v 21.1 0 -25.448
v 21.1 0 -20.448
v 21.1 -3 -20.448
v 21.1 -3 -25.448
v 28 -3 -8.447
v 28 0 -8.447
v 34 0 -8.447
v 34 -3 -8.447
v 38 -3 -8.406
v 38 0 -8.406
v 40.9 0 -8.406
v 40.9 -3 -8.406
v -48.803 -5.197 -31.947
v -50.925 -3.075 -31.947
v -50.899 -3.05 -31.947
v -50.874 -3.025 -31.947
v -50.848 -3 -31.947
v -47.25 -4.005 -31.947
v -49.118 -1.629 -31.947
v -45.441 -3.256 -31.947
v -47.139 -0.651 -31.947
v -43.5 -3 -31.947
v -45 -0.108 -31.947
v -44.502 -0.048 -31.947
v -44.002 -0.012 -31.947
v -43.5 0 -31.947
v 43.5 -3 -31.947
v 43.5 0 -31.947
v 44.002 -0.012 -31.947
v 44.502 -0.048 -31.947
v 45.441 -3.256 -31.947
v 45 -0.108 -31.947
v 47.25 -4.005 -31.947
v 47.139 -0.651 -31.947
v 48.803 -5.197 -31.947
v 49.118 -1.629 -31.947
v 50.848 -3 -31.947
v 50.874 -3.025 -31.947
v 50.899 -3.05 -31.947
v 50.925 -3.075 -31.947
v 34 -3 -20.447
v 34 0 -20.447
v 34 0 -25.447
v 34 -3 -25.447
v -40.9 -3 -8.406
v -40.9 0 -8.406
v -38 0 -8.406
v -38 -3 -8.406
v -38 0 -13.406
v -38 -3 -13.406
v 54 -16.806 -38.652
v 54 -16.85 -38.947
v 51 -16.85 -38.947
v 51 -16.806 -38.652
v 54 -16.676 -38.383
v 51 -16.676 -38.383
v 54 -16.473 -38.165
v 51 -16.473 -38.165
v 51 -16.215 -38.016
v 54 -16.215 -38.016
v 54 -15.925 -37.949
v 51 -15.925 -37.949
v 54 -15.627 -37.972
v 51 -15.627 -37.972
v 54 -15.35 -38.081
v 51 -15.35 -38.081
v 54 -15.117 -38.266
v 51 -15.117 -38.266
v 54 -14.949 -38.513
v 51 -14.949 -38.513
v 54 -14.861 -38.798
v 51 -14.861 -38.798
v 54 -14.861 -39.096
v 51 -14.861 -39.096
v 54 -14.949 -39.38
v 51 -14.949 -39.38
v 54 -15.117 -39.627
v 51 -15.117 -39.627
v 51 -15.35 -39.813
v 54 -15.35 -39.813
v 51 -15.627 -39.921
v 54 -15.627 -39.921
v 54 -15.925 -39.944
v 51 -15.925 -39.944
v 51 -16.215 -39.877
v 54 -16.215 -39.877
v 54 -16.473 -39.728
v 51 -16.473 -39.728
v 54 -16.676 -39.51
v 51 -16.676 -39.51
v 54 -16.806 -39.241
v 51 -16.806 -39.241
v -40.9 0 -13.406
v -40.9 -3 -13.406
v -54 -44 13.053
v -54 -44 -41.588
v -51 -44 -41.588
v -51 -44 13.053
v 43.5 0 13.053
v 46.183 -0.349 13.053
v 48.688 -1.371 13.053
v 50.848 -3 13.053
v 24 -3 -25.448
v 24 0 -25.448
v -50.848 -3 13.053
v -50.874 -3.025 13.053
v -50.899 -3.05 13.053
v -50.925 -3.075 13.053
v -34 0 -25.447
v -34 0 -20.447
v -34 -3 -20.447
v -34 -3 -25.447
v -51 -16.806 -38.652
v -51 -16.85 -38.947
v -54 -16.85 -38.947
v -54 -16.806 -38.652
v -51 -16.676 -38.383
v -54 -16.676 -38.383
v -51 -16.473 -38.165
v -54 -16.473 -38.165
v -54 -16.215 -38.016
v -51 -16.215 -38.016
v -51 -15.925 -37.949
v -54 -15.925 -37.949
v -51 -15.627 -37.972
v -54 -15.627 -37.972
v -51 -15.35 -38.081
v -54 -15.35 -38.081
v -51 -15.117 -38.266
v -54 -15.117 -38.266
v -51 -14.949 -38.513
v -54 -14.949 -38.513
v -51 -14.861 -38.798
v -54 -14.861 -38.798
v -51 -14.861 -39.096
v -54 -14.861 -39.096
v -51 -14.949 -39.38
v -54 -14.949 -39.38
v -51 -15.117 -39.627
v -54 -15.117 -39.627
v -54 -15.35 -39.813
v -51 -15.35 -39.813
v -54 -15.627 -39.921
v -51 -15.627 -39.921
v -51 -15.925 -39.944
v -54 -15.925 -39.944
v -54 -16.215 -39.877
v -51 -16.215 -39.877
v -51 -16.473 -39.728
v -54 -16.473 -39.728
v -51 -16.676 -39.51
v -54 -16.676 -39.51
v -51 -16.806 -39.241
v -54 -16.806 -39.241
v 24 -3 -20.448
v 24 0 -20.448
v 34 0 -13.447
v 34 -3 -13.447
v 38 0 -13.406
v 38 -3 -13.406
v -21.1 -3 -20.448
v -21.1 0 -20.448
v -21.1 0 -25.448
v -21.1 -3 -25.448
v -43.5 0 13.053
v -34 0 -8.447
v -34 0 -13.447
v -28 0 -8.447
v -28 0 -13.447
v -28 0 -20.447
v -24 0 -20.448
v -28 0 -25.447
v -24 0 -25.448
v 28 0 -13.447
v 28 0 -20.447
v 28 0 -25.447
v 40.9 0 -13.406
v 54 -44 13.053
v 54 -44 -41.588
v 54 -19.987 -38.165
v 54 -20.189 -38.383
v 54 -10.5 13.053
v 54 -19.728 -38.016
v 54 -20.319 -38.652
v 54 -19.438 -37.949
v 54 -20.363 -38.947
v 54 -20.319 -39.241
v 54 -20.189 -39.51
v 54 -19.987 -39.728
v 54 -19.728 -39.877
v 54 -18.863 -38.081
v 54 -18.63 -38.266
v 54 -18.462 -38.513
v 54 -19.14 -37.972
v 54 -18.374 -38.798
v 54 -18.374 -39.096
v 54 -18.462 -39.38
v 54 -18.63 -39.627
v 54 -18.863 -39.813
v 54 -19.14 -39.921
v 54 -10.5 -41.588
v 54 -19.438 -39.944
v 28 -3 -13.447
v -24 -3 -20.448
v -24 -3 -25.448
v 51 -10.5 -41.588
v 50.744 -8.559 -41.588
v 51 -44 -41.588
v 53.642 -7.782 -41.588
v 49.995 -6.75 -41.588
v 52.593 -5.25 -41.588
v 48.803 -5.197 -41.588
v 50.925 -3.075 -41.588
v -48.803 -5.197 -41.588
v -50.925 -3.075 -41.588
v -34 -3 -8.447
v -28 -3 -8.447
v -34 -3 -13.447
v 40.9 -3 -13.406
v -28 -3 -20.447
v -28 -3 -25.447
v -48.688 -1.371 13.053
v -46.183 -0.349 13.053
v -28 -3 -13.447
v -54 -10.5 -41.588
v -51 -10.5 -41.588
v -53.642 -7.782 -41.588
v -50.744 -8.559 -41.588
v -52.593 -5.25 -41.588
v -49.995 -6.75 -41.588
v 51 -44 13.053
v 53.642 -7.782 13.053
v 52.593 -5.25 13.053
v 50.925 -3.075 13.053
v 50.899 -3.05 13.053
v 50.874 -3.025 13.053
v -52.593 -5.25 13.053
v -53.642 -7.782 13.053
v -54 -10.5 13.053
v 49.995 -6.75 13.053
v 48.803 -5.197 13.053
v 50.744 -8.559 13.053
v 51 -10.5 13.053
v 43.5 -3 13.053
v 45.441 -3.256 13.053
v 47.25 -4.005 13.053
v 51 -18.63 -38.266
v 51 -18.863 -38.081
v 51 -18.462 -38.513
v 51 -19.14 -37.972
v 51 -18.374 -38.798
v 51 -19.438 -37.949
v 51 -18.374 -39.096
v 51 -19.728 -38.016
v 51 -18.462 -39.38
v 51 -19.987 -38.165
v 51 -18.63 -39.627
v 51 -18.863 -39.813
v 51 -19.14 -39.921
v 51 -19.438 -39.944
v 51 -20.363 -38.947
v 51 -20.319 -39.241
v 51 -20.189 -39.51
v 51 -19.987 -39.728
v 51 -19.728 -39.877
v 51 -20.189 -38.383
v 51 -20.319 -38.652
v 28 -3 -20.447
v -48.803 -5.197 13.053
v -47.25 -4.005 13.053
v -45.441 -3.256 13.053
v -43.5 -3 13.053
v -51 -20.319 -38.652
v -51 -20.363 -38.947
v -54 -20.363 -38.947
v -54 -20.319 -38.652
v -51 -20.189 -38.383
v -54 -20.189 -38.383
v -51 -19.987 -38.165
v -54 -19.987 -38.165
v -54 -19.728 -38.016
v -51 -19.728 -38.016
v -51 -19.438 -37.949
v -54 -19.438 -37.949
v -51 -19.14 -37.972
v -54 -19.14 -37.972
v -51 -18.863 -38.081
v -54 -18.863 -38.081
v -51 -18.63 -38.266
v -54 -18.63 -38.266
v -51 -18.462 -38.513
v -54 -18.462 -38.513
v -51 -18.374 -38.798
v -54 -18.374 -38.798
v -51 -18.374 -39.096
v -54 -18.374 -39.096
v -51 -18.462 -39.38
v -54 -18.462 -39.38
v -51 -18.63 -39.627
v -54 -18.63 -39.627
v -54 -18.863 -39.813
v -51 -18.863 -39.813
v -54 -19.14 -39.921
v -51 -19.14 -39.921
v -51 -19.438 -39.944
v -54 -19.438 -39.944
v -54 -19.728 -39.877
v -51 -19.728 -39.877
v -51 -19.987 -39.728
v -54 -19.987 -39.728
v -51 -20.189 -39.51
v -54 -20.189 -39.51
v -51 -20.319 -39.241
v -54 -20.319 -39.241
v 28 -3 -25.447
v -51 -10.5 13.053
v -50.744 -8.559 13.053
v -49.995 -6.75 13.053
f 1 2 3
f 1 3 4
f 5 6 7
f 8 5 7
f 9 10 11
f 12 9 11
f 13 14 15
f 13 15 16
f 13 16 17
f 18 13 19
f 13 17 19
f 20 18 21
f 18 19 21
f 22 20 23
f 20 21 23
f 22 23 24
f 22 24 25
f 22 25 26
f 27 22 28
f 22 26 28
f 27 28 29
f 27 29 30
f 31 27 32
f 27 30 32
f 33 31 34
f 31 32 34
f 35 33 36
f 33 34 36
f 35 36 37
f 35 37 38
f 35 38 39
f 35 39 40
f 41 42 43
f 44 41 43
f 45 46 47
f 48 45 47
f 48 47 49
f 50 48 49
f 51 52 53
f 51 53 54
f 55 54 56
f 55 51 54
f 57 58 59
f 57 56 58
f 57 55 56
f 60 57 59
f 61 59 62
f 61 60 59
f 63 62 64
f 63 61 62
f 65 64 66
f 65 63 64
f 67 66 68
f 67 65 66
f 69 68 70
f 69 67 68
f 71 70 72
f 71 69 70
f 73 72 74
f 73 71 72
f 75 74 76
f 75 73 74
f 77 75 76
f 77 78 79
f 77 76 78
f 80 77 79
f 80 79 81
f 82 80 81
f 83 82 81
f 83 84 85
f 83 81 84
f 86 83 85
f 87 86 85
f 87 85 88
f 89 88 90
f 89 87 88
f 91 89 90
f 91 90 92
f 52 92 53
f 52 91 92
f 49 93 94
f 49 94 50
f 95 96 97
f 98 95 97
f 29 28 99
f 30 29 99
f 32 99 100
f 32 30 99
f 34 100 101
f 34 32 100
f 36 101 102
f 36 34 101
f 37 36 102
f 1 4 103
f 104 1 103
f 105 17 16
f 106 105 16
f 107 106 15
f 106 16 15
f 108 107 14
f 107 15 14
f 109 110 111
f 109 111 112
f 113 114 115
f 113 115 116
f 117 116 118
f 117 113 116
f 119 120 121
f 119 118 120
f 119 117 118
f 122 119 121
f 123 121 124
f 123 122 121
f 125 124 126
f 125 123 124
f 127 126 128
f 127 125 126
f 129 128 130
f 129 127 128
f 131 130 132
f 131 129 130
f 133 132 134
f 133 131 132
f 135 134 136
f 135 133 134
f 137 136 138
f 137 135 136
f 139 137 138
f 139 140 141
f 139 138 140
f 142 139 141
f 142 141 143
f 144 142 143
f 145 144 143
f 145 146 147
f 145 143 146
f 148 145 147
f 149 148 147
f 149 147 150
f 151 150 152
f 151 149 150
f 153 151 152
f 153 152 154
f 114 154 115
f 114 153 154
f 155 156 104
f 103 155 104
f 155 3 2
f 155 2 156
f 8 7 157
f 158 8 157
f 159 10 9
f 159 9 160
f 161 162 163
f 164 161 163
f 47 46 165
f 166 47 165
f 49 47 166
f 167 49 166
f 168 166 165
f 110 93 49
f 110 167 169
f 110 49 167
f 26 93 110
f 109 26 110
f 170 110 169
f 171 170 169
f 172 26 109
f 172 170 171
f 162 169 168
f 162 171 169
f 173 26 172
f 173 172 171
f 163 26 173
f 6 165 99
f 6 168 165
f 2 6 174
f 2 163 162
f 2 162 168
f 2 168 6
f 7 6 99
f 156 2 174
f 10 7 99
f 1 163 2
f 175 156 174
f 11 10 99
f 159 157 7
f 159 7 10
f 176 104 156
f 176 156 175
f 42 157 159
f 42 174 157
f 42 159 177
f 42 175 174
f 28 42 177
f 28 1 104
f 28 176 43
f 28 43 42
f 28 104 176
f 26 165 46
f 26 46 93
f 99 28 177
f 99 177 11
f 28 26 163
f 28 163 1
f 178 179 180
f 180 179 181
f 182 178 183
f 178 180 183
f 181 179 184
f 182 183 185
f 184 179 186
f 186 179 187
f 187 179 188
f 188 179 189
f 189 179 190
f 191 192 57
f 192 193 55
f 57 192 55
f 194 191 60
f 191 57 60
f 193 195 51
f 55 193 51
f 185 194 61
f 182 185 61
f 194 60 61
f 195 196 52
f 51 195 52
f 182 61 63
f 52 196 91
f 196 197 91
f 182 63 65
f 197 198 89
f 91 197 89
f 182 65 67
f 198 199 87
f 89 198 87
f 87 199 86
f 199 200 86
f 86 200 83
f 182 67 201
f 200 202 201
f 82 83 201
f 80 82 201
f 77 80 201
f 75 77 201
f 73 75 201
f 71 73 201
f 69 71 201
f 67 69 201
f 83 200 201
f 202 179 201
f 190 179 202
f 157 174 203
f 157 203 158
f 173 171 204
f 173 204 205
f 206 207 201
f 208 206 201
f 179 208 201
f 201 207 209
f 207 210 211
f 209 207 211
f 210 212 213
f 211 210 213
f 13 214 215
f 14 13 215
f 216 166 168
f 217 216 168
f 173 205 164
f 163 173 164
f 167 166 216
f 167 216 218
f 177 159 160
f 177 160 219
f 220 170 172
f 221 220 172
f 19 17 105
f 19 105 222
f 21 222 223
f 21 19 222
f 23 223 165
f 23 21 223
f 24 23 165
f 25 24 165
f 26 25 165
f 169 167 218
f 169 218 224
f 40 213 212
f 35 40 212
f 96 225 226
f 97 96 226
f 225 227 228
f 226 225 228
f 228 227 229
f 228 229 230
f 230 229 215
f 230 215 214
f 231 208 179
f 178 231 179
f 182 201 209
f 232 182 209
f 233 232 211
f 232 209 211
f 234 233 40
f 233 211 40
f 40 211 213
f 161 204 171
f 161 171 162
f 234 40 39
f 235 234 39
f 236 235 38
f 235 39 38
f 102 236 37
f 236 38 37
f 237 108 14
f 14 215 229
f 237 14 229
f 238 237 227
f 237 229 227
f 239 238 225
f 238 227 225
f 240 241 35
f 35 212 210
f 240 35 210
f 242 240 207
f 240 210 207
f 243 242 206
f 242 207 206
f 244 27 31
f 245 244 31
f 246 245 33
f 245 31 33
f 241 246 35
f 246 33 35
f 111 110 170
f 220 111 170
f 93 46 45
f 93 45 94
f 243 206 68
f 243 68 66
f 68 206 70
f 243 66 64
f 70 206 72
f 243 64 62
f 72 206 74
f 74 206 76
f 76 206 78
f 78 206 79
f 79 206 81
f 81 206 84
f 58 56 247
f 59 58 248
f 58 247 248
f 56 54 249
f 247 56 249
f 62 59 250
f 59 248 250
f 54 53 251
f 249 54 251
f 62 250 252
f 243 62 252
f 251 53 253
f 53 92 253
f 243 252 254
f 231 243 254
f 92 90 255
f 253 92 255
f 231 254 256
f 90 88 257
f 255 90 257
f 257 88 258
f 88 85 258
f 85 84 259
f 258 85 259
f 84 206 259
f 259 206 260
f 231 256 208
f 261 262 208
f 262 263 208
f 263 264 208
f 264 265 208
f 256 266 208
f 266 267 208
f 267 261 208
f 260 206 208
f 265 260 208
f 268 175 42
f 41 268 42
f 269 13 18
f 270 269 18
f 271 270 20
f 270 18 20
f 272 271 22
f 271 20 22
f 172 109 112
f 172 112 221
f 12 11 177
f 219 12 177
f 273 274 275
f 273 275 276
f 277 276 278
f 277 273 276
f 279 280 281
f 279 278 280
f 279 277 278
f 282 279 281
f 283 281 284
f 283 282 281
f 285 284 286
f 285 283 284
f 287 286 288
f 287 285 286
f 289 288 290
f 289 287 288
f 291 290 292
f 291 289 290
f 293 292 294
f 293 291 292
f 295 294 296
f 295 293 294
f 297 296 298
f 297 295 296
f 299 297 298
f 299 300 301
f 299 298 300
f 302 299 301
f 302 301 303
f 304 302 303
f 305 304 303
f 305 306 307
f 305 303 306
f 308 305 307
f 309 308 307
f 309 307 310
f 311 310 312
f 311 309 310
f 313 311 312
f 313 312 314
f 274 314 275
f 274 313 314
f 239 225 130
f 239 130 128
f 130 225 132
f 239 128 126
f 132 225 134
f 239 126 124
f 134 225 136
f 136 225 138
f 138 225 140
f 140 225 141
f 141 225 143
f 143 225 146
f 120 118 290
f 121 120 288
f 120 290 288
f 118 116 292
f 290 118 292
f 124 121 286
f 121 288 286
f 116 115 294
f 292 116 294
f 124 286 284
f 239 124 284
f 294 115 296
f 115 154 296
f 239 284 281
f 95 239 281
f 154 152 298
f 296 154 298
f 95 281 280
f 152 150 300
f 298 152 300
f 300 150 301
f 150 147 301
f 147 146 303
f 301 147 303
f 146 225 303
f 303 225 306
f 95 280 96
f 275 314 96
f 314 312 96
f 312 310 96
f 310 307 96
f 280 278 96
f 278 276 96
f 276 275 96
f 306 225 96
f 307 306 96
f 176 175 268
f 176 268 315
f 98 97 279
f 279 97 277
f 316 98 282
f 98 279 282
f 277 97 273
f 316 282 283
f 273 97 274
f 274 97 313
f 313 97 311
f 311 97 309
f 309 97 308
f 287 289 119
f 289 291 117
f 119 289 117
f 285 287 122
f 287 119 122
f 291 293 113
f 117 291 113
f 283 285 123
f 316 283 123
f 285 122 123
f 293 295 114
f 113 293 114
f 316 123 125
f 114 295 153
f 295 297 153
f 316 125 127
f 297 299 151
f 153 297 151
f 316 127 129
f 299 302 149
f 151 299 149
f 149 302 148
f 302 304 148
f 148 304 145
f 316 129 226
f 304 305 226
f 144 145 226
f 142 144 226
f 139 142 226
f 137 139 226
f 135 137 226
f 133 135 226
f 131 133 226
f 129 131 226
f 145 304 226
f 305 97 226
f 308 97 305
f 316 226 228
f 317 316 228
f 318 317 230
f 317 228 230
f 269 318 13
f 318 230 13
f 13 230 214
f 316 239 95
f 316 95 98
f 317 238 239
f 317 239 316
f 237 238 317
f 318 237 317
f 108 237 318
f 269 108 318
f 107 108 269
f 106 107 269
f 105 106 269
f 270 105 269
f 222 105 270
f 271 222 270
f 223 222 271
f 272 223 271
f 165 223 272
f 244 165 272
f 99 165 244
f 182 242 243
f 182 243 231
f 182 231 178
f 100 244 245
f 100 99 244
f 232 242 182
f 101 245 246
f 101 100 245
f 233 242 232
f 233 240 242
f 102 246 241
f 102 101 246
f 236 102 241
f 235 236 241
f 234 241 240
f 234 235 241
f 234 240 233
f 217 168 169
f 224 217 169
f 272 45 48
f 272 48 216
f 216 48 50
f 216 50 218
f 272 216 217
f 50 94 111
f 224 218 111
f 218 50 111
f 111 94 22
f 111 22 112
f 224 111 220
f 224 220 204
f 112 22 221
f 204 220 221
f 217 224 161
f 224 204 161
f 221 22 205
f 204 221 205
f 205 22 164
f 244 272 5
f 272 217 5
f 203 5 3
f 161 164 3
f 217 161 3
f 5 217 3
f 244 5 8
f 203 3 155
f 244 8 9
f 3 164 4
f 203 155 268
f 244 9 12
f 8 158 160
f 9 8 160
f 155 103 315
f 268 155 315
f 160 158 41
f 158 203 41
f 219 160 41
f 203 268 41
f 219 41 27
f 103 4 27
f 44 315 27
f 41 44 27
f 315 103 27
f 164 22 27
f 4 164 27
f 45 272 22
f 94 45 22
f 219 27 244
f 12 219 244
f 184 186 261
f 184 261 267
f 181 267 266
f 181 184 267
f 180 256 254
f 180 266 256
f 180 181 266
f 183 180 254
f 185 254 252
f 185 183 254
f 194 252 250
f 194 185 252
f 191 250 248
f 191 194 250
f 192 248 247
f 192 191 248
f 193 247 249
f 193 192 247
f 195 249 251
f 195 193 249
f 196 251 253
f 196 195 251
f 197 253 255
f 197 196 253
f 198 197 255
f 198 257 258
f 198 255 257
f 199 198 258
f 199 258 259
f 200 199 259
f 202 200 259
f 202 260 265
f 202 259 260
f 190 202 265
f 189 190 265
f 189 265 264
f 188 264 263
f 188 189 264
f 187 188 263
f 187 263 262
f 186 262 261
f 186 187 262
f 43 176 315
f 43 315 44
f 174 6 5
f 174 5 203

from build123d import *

# Parameters (mm, degrees)
SKETCH1_W               = 2.9
SKETCH1_H               = 5
SKETCH1_W_2             = 6
BASE_FLANGE1_DEPTH      = 3
SKETCHED_START          = -41.587720567
SKETCHED_BEND1_DEPTH    = 54.641148945
SKETCHED_BEND1_2_DEPTH  = 9.641148945
SKETCHED_BEND1_3_DEPTH  = 54.641148945
SKETCHED_START_2        = -31.946571622
SKETCHED_BEND1_4_DEPTH  = 45
CUT_EXTRUDE2_DEPTH      = 122.204531689
CUT_EXTRUDE2_DEPTH_BACK = 122.204531689
SKETCH32_R              = 1


# Read off the part's stored shape, not the designer's step: Sketched Bend1
# Sheet-metal steps are written as plain solids
with BuildPart() as part:
    # Sketch1 → Base-Flange1 (new body)
    with BuildSketch(Plane(origin=(0, 0, 0), x_dir=(1, 0, 0), z_dir=(0, 1, 0))):
        Polygon((-80, 31.946571622), (-80, -13.053428378), (80, -13.053428378), (80, 31.946571622), (80, 41.587720567), (45, 41.587720567), (45, 31.946571622), (-45, 31.946571622), (-45, 41.587720567), (-80, 41.587720567), align=None)
        with Locations((-39.45, 10.905641405)):
            Rectangle(SKETCH1_W, SKETCH1_H, mode=Mode.SUBTRACT)
        with Locations((-22.55, 22.947848405)):
            Rectangle(SKETCH1_W, SKETCH1_H, mode=Mode.SUBTRACT)
        with Locations((-31, 22.946571622)):
            Rectangle(SKETCH1_W_2, SKETCH1_H, mode=Mode.SUBTRACT)
        with Locations((-31, 10.946571622)):
            Rectangle(SKETCH1_W_2, SKETCH1_H, mode=Mode.SUBTRACT)
        with Locations((31, 10.946571622)):
            Rectangle(SKETCH1_W_2, SKETCH1_H, mode=Mode.SUBTRACT)
        with Locations((31, 22.946571622)):
            Rectangle(SKETCH1_W_2, SKETCH1_H, mode=Mode.SUBTRACT)
        with Locations((22.55, 22.947848405)):
            Rectangle(SKETCH1_W, SKETCH1_H, mode=Mode.SUBTRACT)
        with Locations((39.45, 10.905641405)):
            Rectangle(SKETCH1_W, SKETCH1_H, mode=Mode.SUBTRACT)
    extrude(amount=-BASE_FLANGE1_DEPTH)

    # Sketched Bend1 outline → Sketched Bend1 (cut)
    with BuildSketch(Plane.XY.offset(SKETCHED_START)):
        with BuildLine():
            Line((50.848469227, -3), (80, -3))
            Line((80, -3), (80, 0))
            Line((80, 0), (43.5, 0))
            ThreePointArc((43.5, 0), (47.468626966, -0.778888953), (50.848469227, -3))
        make_face()
        with BuildLine():
            Line((-43.5, 0), (-80, 0))
            Line((-80, 0), (-80, -3))
            Line((-80, -3), (-50.848469227, -3))
            ThreePointArc((-50.848469227, -3), (-47.468626966, -0.778888953), (-43.5, 0))
        make_face()
    extrude(amount=SKETCHED_BEND1_DEPTH, mode=Mode.SUBTRACT)

    # Sketched Bend1 2 outline → Sketched Bend1 2 (cut)
    with BuildSketch(Plane.XY.offset(SKETCHED_START)):
        with BuildLine():
            Line((45, -3), (50.848469227, -3))
            ThreePointArc((50.848469227, -3), (48.154590073, -1.088050614), (45, -0.107695155))
            Line((45, -0.107695155), (45, -3))
        make_face()
        with BuildLine():
            Line((-50.848469227, -3), (-45, -3))
            Line((-45, -3), (-45, -0.107695155))
            ThreePointArc((-45, -0.107695155), (-48.154590073, -1.088050614), (-50.848469227, -3))
        make_face()
    extrude(amount=SKETCHED_BEND1_2_DEPTH, mode=Mode.SUBTRACT)



with BuildPart() as body_2:
    # Sketched Bend1 3 outline → Sketched Bend1 3 (new body)
    with BuildSketch(Plane.XY.offset(SKETCHED_START)):
        with BuildLine():
            Line((50.924621202, -3.075378798), (48.803300859, -5.196699141))
            ThreePointArc((48.803300859, -5.196699141), (50.429096494, -7.629874257), (51, -10.5))
            Line((51, -10.5), (51, -44))
            Line((51, -44), (54, -44))
            Line((54, -44), (54, -10.5))
            ThreePointArc((54, -10.5), (53.200735091, -6.48182396), (50.924621202, -3.075378798))
        make_face()
        with BuildLine():
            ThreePointArc((-51, -10.5), (-50.429096494, -7.629874257), (-48.803300859, -5.196699141))
            Line((-48.803300859, -5.196699141), (-50.924621202, -3.075378798))
            ThreePointArc((-50.924621202, -3.075378798), (-53.200735091, -6.48182396), (-54, -10.5))
            Line((-54, -10.5), (-54, -44))
            Line((-54, -44), (-51, -44))
            Line((-51, -44), (-51, -10.5))
        make_face()
    extrude(amount=SKETCHED_BEND1_3_DEPTH)


with BuildPart() as part_1:
    add(part.part)

    add(body_2.part)  # Sketched Bend1 4 merges body 2
    # Sketched Bend1 4 outline → Sketched Bend1 4 (add)
    with BuildSketch(Plane.XY.offset(SKETCHED_START_2)):
        with BuildLine():
            ThreePointArc((43.5, -3), (46.370125743, -3.570903506), (48.803300859, -5.196699141))
            Line((48.803300859, -5.196699141), (50.924621202, -3.075378798))
            ThreePointArc((50.924621202, -3.075378798), (50.886641368, -3.037592259), (50.848469227, -3))
            Line((50.848469227, -3), (43.5, -3))
        make_face()
        with BuildLine():
            ThreePointArc((-48.803300859, -5.196699141), (-46.370125743, -3.570903506), (-43.5, -3))
            Line((-43.5, -3), (-50.848469227, -3))
            ThreePointArc((-50.848469227, -3), (-50.886641368, -3.037592259), (-50.924621202, -3.075378798))
            Line((-50.924621202, -3.075378798), (-48.803300859, -5.196699141))
        make_face()
    extrude(amount=SKETCHED_BEND1_4_DEPTH)

    # Sketch32 → Cut-Extrude2 (cut, two sides: drawn at the far end of the back side and taken through both)
    with BuildSketch(Plane.ZY.offset(-51).offset(-CUT_EXTRUDE2_DEPTH_BACK)):
        with Locations(Location((-38.946571622, -19.363015099, 0), (0, 0, 270))):
            Circle(SKETCH32_R)
        with Locations(Location((-38.946571622, -15.85, 0), (0, 0, 270))):
            Circle(SKETCH32_R)
    extrude(amount=CUT_EXTRUDE2_DEPTH + CUT_EXTRUDE2_DEPTH_BACK, mode=Mode.SUBTRACT)


solid = part_1.part
